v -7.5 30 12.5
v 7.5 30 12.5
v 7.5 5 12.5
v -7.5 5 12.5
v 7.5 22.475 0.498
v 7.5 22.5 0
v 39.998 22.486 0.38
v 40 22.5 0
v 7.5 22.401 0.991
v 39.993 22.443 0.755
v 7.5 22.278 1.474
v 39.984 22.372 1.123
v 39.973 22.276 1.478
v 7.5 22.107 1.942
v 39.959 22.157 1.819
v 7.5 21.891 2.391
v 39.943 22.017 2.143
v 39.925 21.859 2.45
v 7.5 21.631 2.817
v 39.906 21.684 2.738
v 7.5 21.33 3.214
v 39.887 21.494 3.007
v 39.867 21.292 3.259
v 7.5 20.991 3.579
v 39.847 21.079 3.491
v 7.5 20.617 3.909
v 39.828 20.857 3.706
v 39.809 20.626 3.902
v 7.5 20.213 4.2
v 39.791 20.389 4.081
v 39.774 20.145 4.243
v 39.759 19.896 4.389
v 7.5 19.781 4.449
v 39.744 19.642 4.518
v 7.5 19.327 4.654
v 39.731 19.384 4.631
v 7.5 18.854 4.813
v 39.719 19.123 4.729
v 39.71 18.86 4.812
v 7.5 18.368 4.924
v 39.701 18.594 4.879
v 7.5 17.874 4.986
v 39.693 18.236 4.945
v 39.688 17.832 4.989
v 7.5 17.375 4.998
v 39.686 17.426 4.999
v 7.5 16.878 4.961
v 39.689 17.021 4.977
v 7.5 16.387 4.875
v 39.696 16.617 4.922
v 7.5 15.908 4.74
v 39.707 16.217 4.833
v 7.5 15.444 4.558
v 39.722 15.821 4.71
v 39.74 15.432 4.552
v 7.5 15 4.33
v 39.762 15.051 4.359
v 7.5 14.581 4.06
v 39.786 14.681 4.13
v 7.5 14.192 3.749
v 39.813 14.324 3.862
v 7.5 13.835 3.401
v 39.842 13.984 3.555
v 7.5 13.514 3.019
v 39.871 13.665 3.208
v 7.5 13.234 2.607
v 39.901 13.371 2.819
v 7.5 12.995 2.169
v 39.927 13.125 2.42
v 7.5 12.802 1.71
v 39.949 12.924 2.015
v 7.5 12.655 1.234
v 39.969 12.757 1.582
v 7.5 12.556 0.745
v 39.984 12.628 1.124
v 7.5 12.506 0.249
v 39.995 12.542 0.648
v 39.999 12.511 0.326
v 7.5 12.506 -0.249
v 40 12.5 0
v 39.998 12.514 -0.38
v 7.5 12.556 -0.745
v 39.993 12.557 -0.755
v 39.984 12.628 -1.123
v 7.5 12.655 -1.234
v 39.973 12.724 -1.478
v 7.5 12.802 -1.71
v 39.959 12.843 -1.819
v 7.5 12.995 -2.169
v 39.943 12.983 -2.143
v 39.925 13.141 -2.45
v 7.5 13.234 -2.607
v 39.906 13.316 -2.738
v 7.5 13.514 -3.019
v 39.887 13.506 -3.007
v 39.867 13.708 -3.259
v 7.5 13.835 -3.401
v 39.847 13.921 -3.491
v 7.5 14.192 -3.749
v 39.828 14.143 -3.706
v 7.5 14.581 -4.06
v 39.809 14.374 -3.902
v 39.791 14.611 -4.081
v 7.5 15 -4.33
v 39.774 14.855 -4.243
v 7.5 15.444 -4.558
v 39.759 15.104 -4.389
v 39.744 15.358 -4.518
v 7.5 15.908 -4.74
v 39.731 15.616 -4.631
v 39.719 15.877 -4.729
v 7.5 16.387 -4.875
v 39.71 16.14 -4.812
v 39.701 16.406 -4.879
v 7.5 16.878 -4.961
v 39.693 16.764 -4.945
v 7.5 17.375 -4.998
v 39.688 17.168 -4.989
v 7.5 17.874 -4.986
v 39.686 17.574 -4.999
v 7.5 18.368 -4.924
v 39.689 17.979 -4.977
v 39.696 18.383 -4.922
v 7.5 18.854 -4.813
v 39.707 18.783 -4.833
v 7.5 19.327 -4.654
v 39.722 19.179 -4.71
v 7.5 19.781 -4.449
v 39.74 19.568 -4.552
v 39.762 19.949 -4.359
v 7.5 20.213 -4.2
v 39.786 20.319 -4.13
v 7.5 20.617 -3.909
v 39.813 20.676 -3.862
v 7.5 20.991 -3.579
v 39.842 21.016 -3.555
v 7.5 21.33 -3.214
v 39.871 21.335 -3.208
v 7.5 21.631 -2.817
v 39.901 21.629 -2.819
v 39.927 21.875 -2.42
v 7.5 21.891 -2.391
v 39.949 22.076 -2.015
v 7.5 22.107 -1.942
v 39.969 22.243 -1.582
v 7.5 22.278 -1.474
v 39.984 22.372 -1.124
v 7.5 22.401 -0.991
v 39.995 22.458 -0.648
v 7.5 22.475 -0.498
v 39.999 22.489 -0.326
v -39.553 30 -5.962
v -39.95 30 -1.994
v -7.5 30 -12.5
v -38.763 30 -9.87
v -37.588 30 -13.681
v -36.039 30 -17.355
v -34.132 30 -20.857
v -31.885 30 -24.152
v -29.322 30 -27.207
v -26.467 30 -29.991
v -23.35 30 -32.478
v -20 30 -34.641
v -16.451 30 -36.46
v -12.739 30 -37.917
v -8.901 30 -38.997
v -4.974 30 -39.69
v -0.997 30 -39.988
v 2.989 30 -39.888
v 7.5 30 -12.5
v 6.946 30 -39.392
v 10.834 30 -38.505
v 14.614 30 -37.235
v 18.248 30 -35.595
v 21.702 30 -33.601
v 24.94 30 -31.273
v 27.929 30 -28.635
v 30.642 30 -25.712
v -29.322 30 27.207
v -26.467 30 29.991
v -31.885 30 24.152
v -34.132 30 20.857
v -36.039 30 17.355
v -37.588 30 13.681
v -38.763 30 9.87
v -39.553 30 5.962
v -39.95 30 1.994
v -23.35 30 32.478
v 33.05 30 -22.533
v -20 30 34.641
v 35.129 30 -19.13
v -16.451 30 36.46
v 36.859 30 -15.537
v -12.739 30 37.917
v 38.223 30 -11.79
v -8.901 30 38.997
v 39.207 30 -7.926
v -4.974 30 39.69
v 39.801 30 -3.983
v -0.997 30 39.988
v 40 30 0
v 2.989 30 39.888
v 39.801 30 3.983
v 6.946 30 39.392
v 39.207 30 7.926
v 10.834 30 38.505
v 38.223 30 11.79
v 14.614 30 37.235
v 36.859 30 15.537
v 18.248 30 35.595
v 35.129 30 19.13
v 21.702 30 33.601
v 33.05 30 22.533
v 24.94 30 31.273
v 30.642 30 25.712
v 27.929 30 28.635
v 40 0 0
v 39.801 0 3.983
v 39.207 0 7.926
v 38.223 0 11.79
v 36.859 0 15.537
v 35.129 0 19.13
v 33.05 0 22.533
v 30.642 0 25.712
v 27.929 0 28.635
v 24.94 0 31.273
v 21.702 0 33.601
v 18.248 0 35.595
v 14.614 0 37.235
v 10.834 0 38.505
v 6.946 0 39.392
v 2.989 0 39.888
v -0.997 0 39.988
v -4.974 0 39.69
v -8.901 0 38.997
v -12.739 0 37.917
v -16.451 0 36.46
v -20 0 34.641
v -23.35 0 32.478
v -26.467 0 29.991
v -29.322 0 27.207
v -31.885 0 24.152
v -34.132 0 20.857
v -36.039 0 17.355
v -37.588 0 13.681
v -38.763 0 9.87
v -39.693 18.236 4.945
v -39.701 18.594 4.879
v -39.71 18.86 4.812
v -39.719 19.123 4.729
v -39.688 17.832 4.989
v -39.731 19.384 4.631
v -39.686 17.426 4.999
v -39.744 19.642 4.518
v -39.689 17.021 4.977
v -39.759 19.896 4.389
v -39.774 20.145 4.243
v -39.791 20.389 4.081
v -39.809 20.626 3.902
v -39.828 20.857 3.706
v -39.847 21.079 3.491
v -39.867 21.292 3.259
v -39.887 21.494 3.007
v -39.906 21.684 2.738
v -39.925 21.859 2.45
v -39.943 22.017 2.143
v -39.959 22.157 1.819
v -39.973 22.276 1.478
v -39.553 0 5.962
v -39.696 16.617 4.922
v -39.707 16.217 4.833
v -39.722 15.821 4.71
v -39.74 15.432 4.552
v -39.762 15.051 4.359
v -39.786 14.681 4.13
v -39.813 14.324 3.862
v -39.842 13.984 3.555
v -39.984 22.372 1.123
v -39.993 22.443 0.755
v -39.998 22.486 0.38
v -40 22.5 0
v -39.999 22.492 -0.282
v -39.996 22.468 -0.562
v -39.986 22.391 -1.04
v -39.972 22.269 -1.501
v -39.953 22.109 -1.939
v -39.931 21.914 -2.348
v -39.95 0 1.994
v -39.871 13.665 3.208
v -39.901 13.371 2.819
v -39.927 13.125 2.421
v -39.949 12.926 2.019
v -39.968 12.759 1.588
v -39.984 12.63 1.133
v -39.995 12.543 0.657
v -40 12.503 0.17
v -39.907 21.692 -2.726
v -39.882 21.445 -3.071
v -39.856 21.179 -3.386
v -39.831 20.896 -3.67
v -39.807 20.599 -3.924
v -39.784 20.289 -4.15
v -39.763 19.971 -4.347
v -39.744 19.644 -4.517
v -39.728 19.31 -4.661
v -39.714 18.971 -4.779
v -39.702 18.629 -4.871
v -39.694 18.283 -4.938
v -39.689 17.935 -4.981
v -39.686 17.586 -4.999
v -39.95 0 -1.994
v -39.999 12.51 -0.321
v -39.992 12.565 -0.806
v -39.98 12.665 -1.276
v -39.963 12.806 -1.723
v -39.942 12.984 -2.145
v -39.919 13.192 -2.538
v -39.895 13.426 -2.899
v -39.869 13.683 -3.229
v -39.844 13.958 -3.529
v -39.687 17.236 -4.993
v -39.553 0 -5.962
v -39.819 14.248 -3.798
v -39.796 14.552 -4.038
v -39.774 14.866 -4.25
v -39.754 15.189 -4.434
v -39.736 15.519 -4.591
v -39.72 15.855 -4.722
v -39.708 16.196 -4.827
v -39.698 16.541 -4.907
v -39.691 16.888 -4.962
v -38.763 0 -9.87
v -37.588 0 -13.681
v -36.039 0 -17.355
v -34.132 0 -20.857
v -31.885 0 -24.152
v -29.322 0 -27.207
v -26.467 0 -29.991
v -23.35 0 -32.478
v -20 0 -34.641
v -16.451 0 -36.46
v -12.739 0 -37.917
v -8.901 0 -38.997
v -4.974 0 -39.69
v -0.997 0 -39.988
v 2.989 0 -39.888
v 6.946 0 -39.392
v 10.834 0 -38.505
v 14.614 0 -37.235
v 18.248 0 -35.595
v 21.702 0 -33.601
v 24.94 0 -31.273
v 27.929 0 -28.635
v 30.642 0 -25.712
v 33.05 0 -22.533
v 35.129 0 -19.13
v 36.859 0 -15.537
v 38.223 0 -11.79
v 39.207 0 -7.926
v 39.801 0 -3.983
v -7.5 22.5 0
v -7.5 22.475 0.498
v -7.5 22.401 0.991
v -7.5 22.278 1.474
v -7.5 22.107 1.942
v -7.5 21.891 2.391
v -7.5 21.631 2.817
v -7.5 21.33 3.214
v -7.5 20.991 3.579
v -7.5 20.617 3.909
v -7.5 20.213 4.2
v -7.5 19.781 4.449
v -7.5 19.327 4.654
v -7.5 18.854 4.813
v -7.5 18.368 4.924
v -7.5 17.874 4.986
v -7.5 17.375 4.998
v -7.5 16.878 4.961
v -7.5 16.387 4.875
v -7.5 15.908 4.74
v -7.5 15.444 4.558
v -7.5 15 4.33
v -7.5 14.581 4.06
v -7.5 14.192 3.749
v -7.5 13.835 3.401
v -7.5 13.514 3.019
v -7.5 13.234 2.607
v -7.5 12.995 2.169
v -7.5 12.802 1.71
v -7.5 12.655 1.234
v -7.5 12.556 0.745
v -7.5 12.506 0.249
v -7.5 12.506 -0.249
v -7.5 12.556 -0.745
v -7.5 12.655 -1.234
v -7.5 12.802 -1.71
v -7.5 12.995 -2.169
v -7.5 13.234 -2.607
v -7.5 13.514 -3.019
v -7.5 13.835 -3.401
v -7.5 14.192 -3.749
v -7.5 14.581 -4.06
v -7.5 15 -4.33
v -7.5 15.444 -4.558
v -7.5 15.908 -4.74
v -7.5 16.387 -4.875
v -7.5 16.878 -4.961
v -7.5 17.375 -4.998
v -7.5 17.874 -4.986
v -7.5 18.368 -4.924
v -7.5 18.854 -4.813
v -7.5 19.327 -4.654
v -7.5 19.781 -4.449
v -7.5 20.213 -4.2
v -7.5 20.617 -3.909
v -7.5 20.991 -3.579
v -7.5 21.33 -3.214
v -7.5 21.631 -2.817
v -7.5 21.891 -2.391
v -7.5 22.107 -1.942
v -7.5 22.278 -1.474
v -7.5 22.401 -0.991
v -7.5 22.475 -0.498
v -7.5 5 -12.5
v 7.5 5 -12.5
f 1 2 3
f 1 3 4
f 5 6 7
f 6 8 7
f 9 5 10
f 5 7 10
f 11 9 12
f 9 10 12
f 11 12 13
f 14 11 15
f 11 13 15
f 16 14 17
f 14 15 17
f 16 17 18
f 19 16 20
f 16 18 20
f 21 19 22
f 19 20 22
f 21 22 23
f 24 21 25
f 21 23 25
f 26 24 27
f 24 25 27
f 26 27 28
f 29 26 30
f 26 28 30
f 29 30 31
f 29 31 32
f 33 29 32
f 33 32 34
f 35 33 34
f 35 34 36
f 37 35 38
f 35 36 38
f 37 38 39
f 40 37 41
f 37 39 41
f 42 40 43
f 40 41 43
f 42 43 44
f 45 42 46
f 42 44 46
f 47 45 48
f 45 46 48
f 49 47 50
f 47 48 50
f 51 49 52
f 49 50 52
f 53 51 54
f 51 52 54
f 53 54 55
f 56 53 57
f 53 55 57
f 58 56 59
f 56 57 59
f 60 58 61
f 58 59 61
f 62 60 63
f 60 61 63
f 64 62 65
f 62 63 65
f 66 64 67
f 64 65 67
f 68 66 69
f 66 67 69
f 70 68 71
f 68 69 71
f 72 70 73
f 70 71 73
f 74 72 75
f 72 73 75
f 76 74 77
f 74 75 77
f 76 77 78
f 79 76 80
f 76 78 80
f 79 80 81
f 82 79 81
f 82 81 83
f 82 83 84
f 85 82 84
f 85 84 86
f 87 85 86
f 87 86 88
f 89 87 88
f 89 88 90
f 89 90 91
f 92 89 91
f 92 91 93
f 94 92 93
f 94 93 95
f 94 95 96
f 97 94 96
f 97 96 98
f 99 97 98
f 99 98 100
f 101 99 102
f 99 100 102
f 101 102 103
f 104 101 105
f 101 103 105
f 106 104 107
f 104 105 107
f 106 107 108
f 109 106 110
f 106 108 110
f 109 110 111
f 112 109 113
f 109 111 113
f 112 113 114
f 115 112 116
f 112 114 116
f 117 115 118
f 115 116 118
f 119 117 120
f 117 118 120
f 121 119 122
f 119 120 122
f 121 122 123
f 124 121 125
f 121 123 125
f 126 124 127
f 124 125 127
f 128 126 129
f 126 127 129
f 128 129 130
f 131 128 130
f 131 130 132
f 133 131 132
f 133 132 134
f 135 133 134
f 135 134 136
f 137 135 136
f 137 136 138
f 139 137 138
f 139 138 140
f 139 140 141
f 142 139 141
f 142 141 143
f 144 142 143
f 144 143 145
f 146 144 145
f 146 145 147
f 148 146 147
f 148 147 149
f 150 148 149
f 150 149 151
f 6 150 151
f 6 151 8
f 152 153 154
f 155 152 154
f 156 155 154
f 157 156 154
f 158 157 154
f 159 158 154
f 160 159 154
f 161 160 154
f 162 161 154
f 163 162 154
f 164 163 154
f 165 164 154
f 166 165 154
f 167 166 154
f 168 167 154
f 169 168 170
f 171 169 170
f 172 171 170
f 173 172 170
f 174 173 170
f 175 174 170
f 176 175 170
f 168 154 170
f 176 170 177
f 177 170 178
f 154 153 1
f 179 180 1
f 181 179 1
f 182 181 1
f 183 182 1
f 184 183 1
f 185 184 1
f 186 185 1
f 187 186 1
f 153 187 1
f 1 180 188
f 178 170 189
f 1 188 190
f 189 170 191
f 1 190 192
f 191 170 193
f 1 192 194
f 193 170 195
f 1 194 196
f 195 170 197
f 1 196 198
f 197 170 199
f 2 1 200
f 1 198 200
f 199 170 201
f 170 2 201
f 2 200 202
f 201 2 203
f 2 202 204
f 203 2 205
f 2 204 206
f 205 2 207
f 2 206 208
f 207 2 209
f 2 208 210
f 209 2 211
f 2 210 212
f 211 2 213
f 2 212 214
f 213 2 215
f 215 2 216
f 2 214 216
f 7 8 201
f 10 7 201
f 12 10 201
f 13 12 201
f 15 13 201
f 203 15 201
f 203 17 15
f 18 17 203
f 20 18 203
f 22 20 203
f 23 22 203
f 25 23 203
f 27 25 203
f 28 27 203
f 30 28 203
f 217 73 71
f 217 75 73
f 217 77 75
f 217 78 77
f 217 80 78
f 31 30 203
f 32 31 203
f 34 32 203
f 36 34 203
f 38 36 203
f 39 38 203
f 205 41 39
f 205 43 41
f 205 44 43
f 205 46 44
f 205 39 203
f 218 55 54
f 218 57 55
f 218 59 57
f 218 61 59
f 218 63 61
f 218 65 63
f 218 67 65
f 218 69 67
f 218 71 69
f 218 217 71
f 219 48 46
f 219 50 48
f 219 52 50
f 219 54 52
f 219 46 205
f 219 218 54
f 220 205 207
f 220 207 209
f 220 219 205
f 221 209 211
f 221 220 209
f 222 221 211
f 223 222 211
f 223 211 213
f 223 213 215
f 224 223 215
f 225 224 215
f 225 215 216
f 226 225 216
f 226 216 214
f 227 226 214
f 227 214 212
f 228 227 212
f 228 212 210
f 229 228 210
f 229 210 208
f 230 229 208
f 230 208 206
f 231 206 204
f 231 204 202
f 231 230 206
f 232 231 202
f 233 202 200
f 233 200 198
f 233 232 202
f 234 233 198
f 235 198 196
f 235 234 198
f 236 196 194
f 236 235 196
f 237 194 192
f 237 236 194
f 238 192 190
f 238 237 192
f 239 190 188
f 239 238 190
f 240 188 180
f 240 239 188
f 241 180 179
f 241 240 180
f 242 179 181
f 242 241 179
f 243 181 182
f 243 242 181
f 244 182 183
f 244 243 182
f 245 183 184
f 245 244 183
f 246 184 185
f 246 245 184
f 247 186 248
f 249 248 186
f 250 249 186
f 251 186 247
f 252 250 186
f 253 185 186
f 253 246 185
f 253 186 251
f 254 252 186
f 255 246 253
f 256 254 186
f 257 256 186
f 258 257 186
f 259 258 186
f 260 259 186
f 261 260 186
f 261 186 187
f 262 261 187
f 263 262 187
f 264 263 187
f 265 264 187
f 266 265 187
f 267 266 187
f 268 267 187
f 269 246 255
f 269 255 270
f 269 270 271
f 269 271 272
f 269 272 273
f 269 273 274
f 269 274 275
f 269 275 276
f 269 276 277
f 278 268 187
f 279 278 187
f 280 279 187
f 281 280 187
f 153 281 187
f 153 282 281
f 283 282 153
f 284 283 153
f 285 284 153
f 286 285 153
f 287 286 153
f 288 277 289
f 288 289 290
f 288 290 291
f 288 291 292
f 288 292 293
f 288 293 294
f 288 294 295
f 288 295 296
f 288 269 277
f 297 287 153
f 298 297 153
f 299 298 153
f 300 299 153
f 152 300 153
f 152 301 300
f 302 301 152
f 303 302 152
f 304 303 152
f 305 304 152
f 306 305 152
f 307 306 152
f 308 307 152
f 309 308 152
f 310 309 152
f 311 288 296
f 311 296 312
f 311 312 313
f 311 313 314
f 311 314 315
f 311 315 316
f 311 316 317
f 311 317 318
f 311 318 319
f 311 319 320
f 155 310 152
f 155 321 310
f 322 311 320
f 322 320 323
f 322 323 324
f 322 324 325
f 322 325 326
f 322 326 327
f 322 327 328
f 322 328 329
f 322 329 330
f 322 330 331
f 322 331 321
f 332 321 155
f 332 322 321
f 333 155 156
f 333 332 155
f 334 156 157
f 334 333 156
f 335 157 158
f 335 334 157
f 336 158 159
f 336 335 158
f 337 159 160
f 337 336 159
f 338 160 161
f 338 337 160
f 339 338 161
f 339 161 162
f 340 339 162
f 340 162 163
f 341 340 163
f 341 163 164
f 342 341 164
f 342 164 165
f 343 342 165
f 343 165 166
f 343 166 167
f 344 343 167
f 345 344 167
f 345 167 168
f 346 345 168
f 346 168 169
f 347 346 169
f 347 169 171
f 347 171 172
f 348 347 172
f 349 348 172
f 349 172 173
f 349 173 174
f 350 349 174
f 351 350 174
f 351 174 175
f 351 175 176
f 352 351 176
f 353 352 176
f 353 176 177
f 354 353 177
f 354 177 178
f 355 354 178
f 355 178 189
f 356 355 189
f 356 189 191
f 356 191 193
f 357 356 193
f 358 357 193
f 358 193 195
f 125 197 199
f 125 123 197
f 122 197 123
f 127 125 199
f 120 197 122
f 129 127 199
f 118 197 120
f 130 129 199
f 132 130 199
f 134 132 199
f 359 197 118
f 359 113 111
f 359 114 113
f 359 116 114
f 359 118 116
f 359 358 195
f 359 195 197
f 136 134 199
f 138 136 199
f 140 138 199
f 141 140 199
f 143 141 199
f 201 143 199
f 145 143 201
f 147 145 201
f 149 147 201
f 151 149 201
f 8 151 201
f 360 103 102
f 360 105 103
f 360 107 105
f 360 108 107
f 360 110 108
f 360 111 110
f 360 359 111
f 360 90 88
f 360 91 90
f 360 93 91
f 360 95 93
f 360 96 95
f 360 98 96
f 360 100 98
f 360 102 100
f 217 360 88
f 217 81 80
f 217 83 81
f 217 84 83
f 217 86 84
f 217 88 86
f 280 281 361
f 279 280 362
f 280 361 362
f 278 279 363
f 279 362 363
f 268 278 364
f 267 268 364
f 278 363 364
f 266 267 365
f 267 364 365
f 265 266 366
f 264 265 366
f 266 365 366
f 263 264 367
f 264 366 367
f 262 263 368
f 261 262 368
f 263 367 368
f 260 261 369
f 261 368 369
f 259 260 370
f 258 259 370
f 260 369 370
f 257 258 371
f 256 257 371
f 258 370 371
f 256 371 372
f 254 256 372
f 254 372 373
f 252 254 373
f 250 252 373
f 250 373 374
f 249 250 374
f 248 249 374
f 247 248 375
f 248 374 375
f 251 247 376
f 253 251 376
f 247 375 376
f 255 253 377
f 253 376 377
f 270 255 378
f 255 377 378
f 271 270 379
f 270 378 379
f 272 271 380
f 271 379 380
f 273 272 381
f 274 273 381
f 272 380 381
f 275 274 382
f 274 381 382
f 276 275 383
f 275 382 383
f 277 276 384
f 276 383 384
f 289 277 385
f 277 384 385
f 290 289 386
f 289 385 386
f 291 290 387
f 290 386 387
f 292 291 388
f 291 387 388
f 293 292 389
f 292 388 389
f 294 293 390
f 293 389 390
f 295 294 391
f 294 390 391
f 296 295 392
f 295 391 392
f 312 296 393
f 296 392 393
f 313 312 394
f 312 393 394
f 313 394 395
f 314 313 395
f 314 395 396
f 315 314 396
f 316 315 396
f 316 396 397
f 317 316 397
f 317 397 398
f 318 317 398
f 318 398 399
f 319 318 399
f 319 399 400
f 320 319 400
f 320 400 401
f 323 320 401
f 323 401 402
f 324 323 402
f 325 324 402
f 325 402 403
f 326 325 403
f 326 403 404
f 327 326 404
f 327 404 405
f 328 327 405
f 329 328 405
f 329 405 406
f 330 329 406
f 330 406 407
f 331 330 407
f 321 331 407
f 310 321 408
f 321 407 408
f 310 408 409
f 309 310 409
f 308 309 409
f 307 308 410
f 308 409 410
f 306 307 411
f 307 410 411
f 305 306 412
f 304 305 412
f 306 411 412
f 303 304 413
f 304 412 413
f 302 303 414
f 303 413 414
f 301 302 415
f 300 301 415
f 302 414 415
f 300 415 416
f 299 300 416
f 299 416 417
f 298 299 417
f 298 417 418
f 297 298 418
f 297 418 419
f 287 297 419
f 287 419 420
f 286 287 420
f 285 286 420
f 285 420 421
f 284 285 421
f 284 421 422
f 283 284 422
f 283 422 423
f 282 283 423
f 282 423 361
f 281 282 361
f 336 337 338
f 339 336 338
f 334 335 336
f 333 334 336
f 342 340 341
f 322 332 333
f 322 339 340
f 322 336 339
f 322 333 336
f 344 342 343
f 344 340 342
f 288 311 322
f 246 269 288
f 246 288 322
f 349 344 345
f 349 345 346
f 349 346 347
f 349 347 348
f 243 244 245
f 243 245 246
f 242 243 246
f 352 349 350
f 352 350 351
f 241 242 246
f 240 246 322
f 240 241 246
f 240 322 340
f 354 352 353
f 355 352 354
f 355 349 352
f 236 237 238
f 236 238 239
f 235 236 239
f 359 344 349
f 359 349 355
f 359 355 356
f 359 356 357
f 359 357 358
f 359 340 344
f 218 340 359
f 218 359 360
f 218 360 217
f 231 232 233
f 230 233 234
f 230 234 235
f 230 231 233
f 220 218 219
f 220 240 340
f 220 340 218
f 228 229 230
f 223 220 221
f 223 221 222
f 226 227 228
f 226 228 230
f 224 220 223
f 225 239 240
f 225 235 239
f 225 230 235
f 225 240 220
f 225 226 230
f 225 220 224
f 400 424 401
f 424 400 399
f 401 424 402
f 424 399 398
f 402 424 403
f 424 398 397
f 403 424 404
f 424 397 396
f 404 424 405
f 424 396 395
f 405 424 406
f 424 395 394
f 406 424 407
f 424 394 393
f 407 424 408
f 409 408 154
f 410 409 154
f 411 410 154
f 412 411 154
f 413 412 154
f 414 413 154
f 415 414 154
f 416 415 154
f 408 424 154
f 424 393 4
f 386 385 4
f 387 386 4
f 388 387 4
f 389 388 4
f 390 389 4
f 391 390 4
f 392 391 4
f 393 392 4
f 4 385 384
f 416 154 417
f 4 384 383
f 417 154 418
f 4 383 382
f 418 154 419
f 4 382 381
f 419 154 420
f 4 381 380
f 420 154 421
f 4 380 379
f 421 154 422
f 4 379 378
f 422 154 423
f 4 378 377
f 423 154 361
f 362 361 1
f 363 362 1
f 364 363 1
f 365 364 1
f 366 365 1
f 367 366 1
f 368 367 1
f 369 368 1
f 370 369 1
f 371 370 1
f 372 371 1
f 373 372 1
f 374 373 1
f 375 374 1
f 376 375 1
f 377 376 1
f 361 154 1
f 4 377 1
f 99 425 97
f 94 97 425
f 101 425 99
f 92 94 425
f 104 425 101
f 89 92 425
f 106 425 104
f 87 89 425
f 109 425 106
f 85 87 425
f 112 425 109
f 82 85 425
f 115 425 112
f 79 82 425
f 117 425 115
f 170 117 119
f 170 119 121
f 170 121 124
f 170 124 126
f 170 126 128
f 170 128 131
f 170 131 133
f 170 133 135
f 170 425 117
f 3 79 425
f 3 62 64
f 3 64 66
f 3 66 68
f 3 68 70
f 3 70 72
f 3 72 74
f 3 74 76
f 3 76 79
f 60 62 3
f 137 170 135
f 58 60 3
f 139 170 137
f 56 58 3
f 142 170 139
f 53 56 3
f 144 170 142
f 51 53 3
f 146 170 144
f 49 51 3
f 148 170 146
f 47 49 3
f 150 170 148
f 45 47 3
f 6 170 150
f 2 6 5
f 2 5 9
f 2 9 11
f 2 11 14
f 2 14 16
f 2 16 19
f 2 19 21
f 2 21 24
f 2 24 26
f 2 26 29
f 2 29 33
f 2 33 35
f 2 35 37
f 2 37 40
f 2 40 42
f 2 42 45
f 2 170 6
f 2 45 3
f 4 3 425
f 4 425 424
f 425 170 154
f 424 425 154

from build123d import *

# Parameters (mm, degrees)
F0_R     = 40
F1_DEPTH = 30
F2_W     = 15
F2_H     = 25
F3_DEPTH = 25
F4_R     = 5
F5_DEPTH = 61.901644


with BuildPart() as f1:
    # F0 (on Front) → F1 (new body)
    with BuildSketch(Plane.XZ):
        Circle(F0_R)
    extrude(amount=-F1_DEPTH)

    # F2 (on face) → F3 (cut)
    with BuildSketch(Plane(origin=(0, 30, 0), x_dir=(-1, 0, 0), z_dir=(0, 1, 0))):
        Rectangle(F2_W, F2_H)
    extrude(amount=-F3_DEPTH, mode=Mode.SUBTRACT)

    # F4 (on face) → F5 (cut, symmetric)
    with BuildSketch(Plane.YZ.offset(-7.5)):
        with Locations((17.5, 0)):
            Circle(F4_R)
    extrude(amount=F5_DEPTH, both=True, mode=Mode.SUBTRACT)


solid = f1.part
